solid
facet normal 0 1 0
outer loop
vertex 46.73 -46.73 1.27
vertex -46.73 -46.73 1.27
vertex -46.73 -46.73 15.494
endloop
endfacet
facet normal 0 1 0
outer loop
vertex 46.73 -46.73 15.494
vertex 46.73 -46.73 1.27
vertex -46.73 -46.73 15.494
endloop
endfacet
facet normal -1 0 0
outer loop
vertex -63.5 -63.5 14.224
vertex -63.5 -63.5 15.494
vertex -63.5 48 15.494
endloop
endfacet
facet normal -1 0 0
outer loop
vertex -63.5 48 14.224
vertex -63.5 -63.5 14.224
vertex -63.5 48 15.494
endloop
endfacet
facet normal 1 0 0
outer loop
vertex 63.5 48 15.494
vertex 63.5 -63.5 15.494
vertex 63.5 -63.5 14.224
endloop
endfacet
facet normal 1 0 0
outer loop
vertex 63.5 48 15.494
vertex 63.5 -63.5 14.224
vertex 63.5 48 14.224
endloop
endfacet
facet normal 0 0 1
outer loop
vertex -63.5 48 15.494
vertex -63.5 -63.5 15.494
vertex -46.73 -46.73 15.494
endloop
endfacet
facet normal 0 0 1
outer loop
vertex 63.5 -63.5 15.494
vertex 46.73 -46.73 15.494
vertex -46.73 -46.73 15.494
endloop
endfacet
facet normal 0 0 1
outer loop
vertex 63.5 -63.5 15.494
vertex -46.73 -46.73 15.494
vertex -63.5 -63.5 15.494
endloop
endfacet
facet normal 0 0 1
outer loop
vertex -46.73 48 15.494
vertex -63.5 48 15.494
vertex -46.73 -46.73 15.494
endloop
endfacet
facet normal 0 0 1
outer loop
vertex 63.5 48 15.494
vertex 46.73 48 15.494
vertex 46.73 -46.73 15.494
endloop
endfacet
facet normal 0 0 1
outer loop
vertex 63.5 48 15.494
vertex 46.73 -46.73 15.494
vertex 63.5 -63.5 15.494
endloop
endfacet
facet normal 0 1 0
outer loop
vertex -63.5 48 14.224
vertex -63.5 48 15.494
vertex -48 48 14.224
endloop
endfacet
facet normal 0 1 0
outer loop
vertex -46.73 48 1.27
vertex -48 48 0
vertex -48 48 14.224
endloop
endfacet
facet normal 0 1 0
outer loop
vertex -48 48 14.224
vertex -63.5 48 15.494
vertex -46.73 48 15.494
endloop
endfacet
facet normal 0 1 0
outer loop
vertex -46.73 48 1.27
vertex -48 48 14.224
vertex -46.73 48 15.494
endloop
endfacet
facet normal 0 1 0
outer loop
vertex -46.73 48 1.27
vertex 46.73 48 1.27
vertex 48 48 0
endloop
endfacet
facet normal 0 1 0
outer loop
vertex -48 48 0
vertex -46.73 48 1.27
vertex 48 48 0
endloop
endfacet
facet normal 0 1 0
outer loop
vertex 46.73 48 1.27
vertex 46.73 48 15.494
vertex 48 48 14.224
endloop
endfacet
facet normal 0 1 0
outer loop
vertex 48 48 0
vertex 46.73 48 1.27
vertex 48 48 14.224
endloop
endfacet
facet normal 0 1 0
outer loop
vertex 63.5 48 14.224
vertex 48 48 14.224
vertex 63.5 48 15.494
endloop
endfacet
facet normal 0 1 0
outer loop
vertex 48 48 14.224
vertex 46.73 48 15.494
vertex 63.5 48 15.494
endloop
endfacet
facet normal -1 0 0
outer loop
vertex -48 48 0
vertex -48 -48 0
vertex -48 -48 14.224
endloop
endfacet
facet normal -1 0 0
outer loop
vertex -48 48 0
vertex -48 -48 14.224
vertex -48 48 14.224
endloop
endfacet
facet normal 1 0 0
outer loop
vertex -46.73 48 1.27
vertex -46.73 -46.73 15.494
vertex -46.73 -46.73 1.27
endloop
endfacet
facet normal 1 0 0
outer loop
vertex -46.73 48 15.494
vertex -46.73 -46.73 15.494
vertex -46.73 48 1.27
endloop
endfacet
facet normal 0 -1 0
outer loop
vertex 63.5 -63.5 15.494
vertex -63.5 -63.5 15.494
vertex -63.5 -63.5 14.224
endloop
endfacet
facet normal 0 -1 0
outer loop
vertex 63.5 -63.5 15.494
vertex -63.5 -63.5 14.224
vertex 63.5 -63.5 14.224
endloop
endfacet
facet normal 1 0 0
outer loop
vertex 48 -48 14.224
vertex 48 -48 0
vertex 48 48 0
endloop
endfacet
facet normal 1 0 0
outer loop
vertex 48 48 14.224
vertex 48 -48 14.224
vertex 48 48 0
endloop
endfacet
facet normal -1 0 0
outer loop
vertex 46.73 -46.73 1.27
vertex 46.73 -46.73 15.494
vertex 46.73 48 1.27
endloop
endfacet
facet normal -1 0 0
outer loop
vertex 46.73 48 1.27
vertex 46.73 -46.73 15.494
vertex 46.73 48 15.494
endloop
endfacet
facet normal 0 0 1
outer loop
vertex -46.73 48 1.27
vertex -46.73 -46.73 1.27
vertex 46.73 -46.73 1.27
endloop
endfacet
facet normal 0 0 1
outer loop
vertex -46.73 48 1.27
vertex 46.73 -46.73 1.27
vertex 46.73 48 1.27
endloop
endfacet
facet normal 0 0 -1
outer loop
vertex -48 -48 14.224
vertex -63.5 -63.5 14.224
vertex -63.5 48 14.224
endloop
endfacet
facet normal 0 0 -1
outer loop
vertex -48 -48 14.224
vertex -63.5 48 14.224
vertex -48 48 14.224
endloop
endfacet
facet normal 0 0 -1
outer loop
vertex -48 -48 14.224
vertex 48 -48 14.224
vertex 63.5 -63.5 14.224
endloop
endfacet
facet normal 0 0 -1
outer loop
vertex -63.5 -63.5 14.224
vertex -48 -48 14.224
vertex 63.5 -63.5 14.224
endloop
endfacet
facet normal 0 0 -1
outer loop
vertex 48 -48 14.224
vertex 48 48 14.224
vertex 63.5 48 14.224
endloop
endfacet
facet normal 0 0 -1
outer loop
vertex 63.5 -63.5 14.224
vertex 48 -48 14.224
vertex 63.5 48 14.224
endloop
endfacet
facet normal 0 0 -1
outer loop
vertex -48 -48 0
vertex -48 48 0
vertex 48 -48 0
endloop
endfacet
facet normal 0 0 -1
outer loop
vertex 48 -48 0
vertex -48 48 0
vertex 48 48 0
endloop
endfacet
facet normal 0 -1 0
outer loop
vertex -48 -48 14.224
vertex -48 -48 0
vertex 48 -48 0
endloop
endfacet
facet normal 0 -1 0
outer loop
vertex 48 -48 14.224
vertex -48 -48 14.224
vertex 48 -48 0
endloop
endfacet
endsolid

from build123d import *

# Parameters (mm, degrees)
SKETCH1_W           = 96
SKETCH1_H           = 96
BOSS_EXTRUDE1_DEPTH = 15.494
SKETCH2_W           = 127
SKETCH2_H           = 111.5
BOSS_EXTRUDE2_DEPTH = 1.27
SHELL1_START        = -46.73
SHELL1_OUTLINE_W    = 94.73
SHELL1_OUTLINE_H    = 14.224
SHELL1_DEPTH        = 93.46


# Read off the part's stored shape, not the designer's step: Shell1
with BuildPart() as part:
    # Sketch1 → Boss-Extrude1 (new body)
    with BuildSketch(Plane.XY):
        Rectangle(SKETCH1_W, SKETCH1_H)
    extrude(amount=BOSS_EXTRUDE1_DEPTH)

    # Sketch2 → Boss-Extrude2 (add)
    with BuildSketch(Plane.XY.offset(15.494)):
        with Locations((0, -7.75)):
            Rectangle(SKETCH2_W, SKETCH2_H)
    extrude(amount=-BOSS_EXTRUDE2_DEPTH)

    # Shell1 outline → Shell1 (cut)
    with BuildSketch(Plane.YZ.offset(SHELL1_START)):
        with Locations((0.635, 8.382)):
            Rectangle(SHELL1_OUTLINE_W, SHELL1_OUTLINE_H)
    extrude(amount=SHELL1_DEPTH, mode=Mode.SUBTRACT)


solid = part.part
